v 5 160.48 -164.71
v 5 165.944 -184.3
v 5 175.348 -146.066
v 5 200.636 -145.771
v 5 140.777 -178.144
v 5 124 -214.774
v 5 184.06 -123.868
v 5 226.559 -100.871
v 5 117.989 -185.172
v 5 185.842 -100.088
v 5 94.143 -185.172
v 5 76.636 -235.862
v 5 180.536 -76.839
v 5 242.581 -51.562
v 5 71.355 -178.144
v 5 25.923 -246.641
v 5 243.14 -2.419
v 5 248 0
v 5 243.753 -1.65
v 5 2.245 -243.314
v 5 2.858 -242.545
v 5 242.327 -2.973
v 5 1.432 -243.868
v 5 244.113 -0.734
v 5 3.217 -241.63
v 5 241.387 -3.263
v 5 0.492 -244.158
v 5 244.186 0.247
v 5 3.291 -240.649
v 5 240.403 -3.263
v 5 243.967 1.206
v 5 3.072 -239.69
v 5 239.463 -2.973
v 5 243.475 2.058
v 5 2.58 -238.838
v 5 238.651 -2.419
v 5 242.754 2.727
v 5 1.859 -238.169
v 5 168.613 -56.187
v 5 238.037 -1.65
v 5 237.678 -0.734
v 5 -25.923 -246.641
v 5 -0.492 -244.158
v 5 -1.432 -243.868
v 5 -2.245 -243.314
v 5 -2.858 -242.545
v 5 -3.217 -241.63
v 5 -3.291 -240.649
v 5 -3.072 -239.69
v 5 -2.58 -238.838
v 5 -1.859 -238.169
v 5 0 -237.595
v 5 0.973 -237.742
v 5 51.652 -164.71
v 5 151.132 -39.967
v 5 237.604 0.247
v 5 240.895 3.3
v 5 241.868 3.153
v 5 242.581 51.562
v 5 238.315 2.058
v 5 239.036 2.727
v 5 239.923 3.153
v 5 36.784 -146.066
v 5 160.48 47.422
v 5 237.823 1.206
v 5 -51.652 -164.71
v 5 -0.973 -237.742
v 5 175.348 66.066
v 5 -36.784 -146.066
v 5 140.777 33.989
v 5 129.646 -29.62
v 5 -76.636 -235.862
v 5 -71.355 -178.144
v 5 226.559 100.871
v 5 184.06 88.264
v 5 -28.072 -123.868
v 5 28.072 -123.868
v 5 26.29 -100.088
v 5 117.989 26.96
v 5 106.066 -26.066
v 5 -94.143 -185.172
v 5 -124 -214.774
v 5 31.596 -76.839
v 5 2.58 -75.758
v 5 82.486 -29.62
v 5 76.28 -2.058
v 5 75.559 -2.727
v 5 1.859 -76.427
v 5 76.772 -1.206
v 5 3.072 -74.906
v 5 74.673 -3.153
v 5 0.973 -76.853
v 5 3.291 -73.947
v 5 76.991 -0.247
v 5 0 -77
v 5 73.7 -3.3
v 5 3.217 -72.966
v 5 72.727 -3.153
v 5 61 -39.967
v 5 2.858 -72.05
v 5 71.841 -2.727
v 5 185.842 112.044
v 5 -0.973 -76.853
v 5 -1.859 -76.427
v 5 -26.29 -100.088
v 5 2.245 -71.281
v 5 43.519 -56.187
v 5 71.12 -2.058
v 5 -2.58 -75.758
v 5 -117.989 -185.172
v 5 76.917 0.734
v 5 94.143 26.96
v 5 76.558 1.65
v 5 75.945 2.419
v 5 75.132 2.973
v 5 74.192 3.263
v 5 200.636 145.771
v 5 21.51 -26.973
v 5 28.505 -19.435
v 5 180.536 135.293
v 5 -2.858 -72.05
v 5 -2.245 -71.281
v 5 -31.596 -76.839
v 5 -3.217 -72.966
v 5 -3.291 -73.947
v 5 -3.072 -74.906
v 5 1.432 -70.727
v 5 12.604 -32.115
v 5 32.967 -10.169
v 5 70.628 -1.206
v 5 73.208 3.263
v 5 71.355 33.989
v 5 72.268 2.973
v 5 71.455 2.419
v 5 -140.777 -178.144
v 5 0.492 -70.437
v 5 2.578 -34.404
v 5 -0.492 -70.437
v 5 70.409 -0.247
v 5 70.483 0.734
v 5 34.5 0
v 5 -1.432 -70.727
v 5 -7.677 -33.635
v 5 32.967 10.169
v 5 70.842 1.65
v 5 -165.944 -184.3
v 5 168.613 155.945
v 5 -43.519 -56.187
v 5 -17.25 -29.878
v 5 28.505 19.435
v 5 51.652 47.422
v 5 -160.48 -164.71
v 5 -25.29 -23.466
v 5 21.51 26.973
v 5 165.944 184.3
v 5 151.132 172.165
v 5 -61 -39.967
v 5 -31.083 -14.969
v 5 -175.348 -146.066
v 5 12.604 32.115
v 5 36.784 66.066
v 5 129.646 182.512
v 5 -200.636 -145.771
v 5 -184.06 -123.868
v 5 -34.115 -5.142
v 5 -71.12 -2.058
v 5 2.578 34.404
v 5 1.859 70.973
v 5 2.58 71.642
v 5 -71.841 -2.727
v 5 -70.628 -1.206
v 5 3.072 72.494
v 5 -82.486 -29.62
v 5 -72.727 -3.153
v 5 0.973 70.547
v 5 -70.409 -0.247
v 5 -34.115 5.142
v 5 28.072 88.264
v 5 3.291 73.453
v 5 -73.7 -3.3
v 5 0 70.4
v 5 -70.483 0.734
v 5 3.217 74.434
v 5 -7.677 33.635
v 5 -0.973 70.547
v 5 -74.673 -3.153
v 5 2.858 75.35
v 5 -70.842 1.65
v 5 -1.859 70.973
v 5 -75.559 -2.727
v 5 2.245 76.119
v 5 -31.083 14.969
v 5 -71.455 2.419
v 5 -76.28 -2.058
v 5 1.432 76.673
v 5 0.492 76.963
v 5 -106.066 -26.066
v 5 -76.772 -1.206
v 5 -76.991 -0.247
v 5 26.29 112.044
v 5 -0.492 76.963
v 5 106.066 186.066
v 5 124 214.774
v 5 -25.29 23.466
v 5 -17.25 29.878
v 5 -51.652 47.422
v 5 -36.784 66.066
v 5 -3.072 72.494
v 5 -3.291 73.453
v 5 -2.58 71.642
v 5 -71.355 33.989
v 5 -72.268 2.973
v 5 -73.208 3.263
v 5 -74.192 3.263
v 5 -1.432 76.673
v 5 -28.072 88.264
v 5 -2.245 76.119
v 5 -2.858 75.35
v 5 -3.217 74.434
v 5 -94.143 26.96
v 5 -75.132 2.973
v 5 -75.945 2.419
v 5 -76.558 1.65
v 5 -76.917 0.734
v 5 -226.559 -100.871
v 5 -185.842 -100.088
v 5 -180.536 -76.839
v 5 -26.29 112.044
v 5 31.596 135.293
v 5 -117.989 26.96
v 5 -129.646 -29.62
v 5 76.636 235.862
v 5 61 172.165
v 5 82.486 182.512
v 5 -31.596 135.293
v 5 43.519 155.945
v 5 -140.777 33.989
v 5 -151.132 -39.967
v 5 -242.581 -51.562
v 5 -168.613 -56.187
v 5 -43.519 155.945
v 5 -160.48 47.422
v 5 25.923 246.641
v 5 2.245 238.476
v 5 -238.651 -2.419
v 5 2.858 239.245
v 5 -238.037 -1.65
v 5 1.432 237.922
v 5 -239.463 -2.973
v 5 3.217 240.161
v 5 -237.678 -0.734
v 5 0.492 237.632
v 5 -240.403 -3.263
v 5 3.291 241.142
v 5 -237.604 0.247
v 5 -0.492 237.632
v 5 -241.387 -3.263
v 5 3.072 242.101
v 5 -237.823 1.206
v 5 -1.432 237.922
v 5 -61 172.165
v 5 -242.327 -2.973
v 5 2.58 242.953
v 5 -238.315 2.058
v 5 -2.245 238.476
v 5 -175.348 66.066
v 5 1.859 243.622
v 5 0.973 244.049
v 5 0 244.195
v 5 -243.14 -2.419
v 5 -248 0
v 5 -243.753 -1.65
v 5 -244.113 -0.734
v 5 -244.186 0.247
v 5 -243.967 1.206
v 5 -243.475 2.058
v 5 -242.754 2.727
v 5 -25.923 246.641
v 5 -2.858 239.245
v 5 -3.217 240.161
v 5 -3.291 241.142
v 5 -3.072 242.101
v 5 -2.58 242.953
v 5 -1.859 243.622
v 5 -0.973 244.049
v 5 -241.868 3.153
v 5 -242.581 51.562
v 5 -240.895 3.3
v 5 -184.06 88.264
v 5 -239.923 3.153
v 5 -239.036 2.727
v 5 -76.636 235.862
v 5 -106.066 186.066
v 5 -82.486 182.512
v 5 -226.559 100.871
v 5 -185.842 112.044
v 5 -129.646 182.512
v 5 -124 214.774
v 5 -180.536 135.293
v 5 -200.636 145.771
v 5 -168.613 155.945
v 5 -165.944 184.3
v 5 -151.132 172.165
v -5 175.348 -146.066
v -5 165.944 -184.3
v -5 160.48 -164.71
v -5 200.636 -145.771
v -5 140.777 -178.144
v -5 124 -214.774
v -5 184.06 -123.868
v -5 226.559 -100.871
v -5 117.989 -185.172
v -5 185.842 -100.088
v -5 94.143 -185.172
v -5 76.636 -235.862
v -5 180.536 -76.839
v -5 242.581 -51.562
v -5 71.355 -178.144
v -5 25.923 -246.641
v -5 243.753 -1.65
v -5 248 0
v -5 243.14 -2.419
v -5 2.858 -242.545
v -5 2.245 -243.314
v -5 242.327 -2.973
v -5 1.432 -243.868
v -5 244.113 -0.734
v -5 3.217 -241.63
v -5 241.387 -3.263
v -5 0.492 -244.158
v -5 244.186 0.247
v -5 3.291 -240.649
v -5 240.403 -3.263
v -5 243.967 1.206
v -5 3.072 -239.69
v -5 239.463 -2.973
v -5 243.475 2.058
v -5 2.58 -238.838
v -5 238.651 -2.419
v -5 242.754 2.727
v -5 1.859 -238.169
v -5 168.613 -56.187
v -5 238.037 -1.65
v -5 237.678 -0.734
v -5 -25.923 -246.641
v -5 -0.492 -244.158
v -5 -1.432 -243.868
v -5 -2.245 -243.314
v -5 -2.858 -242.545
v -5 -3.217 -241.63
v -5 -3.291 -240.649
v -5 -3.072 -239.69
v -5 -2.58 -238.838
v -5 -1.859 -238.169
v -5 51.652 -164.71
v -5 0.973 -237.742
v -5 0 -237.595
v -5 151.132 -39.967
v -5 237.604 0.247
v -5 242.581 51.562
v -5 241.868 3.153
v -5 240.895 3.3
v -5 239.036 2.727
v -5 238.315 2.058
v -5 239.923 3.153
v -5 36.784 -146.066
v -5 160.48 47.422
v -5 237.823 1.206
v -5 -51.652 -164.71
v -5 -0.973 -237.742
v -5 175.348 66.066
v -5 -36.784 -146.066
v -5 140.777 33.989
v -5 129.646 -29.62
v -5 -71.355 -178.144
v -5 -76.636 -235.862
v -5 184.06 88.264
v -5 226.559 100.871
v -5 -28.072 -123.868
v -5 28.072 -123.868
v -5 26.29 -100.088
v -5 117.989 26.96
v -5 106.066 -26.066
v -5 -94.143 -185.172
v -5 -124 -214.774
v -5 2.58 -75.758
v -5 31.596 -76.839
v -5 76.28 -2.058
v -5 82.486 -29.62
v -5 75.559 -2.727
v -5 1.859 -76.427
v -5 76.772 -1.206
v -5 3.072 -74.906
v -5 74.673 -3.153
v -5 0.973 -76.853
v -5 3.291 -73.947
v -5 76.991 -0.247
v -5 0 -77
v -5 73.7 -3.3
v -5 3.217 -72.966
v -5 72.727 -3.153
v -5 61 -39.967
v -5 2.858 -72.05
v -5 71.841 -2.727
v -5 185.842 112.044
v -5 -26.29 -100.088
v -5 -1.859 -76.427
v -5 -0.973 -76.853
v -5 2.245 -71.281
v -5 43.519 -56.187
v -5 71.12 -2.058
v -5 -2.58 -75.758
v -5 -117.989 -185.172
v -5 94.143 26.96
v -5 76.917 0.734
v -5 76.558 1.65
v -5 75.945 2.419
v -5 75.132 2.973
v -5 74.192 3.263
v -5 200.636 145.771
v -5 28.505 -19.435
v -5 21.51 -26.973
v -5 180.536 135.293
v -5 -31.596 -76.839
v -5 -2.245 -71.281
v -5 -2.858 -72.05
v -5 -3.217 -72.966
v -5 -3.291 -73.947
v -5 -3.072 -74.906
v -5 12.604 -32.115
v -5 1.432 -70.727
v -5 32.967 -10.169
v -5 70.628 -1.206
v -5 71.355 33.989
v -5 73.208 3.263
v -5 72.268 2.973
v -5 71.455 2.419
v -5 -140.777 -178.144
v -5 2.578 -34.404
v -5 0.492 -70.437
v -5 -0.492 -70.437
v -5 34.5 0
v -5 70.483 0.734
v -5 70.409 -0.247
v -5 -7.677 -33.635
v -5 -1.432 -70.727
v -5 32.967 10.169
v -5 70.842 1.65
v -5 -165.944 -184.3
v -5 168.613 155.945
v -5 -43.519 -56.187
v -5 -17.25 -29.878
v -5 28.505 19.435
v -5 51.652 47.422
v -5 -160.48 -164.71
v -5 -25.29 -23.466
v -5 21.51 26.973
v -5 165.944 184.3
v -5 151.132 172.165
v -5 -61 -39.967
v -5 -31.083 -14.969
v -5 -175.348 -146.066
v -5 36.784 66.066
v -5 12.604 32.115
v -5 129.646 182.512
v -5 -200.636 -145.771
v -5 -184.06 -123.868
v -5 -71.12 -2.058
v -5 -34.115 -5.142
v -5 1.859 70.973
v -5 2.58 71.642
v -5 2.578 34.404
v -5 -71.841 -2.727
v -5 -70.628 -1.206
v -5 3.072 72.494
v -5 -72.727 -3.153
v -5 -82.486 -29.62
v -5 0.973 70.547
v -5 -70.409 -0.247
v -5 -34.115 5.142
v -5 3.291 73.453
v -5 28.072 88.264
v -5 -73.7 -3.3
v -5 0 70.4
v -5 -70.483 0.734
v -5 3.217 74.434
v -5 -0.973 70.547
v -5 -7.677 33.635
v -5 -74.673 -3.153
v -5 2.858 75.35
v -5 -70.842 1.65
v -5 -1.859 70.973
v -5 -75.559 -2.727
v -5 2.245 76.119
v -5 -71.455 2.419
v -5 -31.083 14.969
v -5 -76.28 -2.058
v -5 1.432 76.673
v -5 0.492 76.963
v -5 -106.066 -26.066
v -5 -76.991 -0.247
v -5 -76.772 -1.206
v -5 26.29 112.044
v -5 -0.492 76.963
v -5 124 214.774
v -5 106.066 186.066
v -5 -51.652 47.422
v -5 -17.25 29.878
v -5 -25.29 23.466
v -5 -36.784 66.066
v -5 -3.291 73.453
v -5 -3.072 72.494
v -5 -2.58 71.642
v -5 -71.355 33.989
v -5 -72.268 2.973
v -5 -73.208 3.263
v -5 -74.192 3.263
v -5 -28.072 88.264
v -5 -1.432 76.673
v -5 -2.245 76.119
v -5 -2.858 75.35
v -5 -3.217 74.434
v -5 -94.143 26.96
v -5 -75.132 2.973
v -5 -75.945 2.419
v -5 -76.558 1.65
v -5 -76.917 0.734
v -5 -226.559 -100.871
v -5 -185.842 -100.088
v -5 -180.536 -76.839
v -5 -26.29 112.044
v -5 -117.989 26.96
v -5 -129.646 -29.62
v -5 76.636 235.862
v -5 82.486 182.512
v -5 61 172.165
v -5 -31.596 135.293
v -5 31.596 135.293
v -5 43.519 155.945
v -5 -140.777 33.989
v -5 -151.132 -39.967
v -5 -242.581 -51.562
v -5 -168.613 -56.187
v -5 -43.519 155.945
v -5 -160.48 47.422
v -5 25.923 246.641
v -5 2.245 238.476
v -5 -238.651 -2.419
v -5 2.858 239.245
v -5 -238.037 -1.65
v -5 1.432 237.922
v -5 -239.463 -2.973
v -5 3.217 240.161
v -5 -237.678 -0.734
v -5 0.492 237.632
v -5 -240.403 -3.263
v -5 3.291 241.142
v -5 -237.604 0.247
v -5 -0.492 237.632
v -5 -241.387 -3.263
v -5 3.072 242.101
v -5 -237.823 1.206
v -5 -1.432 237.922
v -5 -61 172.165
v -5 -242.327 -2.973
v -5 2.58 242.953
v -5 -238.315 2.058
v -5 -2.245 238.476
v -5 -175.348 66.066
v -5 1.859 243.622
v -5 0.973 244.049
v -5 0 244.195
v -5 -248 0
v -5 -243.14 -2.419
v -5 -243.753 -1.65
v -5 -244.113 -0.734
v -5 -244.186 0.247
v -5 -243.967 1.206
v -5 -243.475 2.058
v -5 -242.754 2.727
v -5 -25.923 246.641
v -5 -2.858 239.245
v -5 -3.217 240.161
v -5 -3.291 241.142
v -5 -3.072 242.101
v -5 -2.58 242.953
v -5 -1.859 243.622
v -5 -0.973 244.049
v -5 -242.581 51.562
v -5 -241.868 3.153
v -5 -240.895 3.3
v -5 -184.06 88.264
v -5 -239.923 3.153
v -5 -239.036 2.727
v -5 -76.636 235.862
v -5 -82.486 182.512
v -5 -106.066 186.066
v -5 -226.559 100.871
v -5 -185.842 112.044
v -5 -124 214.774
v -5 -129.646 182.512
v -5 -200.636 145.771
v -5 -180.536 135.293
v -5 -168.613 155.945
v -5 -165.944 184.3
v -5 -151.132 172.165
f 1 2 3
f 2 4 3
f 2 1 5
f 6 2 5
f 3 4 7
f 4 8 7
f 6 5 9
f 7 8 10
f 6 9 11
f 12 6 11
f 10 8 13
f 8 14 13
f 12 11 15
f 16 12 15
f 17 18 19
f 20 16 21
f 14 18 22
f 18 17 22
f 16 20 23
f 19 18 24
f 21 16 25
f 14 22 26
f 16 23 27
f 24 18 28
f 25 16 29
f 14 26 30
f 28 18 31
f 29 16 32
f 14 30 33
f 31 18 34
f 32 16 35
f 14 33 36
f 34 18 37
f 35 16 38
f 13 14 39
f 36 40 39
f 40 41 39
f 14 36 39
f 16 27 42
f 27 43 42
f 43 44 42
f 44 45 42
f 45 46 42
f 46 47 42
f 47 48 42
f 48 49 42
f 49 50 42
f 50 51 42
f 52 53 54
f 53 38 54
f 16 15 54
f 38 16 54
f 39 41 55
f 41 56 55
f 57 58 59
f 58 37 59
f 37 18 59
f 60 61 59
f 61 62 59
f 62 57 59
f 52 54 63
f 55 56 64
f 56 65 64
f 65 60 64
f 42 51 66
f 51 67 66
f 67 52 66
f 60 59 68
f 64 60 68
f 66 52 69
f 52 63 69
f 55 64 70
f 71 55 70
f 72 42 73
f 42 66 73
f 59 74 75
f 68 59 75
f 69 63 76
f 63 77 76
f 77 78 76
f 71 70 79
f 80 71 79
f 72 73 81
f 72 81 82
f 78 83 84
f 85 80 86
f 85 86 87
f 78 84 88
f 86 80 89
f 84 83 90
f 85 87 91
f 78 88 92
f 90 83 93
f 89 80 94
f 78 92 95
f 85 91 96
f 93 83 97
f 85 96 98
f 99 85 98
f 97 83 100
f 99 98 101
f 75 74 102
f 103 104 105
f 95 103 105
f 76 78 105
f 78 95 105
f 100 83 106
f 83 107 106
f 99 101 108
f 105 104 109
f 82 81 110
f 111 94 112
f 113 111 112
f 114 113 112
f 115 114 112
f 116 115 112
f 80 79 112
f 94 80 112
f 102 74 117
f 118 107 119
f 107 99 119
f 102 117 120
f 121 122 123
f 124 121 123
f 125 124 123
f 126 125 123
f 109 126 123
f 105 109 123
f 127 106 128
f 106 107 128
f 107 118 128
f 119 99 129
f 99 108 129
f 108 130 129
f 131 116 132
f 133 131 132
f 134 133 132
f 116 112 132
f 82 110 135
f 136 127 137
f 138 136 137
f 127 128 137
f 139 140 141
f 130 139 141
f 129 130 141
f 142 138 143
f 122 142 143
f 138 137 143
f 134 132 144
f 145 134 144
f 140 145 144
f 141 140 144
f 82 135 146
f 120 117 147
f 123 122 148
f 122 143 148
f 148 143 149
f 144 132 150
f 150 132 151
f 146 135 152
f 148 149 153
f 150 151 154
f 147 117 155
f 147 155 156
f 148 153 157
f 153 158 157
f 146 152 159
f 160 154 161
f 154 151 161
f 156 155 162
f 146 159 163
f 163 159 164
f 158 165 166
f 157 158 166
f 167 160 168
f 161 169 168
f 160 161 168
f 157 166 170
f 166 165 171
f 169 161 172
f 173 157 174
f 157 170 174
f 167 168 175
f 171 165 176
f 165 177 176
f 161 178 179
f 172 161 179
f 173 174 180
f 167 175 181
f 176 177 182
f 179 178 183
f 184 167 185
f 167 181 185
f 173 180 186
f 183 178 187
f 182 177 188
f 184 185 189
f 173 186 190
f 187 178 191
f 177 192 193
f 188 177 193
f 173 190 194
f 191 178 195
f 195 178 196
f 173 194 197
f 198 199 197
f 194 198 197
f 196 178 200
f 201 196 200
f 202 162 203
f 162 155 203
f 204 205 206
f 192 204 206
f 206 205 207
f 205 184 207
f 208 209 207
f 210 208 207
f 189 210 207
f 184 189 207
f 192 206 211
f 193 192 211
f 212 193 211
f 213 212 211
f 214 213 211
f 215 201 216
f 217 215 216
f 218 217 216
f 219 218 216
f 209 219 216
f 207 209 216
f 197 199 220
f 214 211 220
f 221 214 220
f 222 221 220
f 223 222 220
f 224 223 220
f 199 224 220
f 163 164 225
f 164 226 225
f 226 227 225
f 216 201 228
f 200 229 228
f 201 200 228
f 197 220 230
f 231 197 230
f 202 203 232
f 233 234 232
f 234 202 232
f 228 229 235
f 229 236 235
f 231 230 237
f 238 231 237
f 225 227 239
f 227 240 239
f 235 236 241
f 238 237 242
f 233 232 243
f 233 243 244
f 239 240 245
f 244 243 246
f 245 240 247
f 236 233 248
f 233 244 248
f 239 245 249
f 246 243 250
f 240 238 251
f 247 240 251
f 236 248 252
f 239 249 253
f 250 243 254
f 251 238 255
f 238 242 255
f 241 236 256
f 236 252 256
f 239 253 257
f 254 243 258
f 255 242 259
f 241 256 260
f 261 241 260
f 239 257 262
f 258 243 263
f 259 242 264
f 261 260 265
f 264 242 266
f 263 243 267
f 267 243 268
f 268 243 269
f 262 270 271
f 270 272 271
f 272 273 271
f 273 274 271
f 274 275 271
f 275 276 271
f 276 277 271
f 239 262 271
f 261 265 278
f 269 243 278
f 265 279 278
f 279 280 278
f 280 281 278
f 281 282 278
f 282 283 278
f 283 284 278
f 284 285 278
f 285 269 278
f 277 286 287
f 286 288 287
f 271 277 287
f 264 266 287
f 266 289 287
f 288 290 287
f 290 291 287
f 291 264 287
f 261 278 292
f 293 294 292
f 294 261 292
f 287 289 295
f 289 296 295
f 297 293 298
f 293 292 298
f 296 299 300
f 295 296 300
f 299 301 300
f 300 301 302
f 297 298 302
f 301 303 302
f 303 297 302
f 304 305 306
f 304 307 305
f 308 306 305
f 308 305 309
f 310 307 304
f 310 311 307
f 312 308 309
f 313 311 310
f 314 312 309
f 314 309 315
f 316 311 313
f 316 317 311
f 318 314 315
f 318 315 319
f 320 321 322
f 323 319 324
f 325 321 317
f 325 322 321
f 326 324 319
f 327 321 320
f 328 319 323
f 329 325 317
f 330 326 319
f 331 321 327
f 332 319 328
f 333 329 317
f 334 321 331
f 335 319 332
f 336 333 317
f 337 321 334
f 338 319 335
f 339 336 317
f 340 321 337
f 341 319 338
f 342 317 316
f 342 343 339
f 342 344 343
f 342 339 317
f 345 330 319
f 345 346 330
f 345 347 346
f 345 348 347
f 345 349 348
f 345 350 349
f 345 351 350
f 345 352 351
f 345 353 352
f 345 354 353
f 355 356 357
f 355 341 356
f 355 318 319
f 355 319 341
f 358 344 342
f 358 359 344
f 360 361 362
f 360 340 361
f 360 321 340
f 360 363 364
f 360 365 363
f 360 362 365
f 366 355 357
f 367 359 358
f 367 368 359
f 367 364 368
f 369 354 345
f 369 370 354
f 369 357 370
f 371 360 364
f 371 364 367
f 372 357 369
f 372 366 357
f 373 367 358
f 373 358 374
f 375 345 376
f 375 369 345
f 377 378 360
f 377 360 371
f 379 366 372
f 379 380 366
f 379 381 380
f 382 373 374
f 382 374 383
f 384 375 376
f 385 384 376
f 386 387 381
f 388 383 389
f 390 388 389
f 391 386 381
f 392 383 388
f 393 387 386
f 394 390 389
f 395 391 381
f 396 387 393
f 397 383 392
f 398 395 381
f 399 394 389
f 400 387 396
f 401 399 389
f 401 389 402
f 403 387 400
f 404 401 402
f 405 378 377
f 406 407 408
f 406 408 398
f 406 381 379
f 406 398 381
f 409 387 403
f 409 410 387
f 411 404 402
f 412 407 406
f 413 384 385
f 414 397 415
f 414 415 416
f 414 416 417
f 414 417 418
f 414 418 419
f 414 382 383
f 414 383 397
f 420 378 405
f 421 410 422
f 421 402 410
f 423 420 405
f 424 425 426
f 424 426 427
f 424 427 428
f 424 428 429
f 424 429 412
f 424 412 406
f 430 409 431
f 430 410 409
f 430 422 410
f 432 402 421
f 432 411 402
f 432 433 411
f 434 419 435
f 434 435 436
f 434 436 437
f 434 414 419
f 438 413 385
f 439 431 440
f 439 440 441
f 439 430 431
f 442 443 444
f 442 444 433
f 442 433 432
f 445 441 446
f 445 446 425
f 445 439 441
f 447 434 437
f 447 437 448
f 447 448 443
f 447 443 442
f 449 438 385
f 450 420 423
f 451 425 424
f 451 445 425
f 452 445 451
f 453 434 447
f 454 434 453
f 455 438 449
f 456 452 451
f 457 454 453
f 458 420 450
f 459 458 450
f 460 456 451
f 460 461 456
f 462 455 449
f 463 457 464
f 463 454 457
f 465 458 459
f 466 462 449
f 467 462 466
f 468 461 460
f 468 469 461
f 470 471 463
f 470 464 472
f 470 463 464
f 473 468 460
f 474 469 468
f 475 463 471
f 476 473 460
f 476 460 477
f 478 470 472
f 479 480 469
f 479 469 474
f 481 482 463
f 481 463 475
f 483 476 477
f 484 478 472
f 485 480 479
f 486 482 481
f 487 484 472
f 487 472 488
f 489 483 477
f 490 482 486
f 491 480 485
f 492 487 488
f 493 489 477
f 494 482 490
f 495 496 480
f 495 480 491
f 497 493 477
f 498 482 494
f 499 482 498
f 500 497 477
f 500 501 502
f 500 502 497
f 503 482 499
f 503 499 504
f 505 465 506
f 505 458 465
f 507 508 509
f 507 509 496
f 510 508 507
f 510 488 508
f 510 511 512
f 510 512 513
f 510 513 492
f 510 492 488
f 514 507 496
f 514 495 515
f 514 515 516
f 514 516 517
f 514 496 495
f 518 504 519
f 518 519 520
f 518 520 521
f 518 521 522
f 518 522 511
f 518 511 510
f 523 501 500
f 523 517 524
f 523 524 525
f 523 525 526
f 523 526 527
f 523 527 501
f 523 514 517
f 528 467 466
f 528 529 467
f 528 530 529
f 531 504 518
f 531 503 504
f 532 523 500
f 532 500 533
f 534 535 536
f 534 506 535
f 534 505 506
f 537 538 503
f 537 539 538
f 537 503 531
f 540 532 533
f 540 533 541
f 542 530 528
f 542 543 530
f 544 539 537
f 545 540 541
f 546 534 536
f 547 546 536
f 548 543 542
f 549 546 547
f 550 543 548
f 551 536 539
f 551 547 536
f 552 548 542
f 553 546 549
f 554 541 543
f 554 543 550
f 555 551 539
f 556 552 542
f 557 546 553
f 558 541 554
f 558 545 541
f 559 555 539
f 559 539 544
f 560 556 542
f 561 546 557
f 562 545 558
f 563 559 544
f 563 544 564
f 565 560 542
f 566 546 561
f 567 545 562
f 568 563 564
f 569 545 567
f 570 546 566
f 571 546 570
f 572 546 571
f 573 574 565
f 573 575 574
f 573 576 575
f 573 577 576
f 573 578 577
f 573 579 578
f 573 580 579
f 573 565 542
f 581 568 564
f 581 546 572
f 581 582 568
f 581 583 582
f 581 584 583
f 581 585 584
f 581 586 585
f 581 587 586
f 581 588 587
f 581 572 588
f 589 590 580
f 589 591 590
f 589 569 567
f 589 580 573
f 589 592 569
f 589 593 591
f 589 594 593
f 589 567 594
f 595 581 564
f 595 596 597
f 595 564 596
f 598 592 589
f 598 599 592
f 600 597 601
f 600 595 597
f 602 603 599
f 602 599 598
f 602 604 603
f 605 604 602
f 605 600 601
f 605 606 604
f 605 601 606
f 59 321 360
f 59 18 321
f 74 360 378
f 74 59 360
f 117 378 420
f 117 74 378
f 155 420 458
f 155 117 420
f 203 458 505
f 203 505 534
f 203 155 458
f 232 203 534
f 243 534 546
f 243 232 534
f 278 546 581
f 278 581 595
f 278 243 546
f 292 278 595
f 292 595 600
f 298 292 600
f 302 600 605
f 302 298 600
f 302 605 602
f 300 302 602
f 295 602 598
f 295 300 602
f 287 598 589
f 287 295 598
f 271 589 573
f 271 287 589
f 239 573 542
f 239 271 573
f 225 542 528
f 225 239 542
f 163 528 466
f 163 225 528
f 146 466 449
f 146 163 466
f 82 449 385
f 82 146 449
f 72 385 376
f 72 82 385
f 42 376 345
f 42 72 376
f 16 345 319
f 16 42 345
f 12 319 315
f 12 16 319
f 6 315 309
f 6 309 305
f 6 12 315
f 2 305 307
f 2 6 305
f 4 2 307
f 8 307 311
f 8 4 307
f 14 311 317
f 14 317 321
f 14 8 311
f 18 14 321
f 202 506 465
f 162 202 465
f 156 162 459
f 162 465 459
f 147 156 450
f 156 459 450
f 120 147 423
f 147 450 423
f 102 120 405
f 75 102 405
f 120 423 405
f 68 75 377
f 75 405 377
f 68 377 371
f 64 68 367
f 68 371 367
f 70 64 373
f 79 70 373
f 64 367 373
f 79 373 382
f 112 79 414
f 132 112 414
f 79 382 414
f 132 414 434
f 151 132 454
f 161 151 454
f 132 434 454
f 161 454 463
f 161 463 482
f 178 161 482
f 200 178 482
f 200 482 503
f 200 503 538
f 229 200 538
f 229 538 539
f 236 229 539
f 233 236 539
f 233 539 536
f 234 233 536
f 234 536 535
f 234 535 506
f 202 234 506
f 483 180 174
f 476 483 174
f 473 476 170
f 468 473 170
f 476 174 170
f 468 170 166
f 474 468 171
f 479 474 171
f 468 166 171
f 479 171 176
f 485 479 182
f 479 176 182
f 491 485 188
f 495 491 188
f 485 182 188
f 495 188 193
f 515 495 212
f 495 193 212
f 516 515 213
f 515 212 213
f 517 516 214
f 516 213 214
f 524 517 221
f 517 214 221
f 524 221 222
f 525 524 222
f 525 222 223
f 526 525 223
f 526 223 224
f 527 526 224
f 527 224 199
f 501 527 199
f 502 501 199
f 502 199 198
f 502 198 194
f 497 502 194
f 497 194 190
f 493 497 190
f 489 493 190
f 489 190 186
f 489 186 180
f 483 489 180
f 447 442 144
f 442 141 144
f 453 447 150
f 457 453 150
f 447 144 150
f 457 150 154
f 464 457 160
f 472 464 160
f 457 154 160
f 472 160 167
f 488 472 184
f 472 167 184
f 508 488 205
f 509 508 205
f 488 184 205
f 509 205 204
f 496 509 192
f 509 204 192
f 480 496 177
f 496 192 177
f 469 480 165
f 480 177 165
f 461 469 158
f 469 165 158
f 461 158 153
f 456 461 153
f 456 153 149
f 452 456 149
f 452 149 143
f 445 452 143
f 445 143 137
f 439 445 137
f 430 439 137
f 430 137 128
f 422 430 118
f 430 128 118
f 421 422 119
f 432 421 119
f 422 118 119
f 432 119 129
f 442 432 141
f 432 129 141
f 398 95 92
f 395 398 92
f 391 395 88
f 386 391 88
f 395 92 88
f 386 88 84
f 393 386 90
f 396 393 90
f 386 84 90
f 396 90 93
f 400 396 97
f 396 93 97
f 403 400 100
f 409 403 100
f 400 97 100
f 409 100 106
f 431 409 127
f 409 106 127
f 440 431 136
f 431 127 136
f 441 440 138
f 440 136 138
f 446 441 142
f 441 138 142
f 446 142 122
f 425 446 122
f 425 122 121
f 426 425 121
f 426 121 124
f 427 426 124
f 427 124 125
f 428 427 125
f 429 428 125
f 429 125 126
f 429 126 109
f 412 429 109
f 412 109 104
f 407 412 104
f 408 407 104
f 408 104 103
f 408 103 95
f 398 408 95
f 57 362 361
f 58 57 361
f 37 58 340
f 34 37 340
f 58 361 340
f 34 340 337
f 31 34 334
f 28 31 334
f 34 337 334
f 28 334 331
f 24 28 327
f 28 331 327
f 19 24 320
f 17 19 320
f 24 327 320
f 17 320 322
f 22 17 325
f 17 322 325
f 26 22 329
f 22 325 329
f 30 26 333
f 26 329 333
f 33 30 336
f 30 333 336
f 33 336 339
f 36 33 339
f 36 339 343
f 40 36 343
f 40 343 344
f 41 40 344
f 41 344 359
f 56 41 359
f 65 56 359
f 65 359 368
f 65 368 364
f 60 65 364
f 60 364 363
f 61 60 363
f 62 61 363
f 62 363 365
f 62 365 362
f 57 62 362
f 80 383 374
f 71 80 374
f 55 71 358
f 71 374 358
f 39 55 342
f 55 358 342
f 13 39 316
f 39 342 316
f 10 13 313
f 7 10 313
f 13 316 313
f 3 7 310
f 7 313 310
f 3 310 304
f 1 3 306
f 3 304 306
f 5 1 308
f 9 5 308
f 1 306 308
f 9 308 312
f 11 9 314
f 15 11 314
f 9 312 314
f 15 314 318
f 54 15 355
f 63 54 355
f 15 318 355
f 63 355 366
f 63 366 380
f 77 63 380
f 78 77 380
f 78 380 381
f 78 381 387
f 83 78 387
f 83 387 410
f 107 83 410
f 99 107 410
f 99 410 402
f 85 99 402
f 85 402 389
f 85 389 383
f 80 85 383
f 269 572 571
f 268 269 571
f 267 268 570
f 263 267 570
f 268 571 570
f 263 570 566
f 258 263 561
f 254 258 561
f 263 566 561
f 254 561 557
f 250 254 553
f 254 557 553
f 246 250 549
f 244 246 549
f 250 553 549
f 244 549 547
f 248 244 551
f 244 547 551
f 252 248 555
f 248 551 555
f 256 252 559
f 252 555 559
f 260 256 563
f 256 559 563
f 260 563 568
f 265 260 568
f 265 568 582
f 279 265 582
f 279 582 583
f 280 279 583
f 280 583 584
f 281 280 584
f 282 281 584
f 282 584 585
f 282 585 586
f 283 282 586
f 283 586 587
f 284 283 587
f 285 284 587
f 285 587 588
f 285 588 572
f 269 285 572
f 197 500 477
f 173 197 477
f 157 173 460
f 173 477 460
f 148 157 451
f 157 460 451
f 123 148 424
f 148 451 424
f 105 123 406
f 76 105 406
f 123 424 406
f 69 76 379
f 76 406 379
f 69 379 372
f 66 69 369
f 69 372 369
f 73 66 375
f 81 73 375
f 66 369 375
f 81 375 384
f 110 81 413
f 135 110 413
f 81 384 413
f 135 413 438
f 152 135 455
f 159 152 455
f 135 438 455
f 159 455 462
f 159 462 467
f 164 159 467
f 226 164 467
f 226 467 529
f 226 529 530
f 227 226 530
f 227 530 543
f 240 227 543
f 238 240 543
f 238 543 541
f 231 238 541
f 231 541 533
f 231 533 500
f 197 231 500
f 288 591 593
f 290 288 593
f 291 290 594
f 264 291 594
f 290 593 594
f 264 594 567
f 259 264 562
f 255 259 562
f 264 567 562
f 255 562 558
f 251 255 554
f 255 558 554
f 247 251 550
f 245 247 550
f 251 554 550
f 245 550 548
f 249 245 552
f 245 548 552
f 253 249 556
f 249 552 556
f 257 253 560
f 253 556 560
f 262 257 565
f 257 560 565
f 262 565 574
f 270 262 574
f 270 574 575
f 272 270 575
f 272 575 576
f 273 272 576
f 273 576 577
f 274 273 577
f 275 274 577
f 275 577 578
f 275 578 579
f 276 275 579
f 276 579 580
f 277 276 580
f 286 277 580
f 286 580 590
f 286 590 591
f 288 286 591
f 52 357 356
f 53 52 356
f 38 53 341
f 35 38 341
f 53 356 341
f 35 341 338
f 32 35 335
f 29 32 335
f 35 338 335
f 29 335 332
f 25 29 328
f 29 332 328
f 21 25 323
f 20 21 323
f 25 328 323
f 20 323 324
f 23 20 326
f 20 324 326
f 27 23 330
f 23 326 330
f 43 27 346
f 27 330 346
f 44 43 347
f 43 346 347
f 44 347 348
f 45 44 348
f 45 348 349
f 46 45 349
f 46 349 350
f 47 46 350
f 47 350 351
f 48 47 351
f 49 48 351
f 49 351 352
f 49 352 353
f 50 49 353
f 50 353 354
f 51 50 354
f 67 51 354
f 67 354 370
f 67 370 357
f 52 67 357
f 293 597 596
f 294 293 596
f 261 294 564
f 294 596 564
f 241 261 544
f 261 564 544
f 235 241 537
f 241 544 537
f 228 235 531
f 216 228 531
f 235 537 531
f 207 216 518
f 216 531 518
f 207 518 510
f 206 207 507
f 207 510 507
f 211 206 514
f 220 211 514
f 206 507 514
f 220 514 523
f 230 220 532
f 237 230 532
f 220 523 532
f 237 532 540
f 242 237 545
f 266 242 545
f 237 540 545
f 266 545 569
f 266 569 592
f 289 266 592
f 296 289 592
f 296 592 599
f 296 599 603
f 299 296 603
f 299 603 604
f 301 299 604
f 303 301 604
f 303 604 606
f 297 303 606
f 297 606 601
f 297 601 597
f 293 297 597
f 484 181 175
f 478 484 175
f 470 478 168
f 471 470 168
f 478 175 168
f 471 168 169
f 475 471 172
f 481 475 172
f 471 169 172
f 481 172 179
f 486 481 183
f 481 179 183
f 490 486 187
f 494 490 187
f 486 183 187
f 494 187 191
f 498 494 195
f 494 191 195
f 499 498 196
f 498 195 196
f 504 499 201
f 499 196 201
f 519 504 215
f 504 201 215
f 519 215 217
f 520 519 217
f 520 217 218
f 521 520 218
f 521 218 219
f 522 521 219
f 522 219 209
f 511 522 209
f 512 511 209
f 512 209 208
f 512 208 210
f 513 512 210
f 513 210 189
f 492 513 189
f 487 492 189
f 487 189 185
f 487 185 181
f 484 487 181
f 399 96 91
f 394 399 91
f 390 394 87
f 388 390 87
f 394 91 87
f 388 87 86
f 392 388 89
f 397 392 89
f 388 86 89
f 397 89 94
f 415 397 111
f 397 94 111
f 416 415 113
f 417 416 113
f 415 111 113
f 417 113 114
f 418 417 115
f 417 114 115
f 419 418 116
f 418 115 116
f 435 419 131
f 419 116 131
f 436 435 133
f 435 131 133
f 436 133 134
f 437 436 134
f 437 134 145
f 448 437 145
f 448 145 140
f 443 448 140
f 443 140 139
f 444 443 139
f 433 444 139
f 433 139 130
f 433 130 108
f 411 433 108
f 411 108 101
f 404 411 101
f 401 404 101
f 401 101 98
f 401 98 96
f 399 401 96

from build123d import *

# Parameters (mm, degrees)
ESBO_O1_W               = 10
ESBO_O1_H               = 213.5
FURO_COM_FOLGA_DE_M61_D = 6.6
ESBO_O7_R               = 80
CORTE_EXTRUS_O1_DEPTH   = 11
FURO_COM_FOLGA_DE_M62_D = 6.6


with BuildPart() as part:
    # Esboço1 → Revolução1 (revolve)
    with BuildSketch(Plane.XY):
        with Locations((0, 141.25)):
            Rectangle(ESBO_O1_W, ESBO_O1_H)
    revolve(axis=Axis((0, 0, 0), (1, 0, 0)))

    # Furo com folga de M61 (through all)
    with Locations(Plane.ZY.offset(18.8)):
        with Locations((0, 73.7), (73.7, 0), (0, -73.7), (-73.7, 0), (0, 0)):
            Hole(FURO_COM_FOLGA_DE_M61_D / 2)

    # Esboço7 → Corte-extrusão1 (cut, through all)
    with BuildSketch(Plane.ZY.offset(5)):
        with Locations((106.066017178, 106.066017178)):
            Circle(ESBO_O7_R)
        with Locations((106.066017178, -106.066017178)):
            Circle(ESBO_O7_R)
        with Locations((-106.066017178, -106.066017178)):
            Circle(ESBO_O7_R)
        with Locations((-106.066017178, 106.066017178)):
            Circle(ESBO_O7_R)
    extrude(amount=-CORTE_EXTRUS_O1_DEPTH, mode=Mode.SUBTRACT)

    # Furo com folga de M62 (through all)
    with Locations(Plane(origin=(14.343621622, 0, 0), x_dir=(0, 0, -1), z_dir=(1, 0, 0))):
        with Locations((0, 240.895271507), (240.895271507, 0), (0, -240.895271507), (-240.895271507, 0), (0, 0)):
            Hole(FURO_COM_FOLGA_DE_M62_D / 2)


solid = part.part
